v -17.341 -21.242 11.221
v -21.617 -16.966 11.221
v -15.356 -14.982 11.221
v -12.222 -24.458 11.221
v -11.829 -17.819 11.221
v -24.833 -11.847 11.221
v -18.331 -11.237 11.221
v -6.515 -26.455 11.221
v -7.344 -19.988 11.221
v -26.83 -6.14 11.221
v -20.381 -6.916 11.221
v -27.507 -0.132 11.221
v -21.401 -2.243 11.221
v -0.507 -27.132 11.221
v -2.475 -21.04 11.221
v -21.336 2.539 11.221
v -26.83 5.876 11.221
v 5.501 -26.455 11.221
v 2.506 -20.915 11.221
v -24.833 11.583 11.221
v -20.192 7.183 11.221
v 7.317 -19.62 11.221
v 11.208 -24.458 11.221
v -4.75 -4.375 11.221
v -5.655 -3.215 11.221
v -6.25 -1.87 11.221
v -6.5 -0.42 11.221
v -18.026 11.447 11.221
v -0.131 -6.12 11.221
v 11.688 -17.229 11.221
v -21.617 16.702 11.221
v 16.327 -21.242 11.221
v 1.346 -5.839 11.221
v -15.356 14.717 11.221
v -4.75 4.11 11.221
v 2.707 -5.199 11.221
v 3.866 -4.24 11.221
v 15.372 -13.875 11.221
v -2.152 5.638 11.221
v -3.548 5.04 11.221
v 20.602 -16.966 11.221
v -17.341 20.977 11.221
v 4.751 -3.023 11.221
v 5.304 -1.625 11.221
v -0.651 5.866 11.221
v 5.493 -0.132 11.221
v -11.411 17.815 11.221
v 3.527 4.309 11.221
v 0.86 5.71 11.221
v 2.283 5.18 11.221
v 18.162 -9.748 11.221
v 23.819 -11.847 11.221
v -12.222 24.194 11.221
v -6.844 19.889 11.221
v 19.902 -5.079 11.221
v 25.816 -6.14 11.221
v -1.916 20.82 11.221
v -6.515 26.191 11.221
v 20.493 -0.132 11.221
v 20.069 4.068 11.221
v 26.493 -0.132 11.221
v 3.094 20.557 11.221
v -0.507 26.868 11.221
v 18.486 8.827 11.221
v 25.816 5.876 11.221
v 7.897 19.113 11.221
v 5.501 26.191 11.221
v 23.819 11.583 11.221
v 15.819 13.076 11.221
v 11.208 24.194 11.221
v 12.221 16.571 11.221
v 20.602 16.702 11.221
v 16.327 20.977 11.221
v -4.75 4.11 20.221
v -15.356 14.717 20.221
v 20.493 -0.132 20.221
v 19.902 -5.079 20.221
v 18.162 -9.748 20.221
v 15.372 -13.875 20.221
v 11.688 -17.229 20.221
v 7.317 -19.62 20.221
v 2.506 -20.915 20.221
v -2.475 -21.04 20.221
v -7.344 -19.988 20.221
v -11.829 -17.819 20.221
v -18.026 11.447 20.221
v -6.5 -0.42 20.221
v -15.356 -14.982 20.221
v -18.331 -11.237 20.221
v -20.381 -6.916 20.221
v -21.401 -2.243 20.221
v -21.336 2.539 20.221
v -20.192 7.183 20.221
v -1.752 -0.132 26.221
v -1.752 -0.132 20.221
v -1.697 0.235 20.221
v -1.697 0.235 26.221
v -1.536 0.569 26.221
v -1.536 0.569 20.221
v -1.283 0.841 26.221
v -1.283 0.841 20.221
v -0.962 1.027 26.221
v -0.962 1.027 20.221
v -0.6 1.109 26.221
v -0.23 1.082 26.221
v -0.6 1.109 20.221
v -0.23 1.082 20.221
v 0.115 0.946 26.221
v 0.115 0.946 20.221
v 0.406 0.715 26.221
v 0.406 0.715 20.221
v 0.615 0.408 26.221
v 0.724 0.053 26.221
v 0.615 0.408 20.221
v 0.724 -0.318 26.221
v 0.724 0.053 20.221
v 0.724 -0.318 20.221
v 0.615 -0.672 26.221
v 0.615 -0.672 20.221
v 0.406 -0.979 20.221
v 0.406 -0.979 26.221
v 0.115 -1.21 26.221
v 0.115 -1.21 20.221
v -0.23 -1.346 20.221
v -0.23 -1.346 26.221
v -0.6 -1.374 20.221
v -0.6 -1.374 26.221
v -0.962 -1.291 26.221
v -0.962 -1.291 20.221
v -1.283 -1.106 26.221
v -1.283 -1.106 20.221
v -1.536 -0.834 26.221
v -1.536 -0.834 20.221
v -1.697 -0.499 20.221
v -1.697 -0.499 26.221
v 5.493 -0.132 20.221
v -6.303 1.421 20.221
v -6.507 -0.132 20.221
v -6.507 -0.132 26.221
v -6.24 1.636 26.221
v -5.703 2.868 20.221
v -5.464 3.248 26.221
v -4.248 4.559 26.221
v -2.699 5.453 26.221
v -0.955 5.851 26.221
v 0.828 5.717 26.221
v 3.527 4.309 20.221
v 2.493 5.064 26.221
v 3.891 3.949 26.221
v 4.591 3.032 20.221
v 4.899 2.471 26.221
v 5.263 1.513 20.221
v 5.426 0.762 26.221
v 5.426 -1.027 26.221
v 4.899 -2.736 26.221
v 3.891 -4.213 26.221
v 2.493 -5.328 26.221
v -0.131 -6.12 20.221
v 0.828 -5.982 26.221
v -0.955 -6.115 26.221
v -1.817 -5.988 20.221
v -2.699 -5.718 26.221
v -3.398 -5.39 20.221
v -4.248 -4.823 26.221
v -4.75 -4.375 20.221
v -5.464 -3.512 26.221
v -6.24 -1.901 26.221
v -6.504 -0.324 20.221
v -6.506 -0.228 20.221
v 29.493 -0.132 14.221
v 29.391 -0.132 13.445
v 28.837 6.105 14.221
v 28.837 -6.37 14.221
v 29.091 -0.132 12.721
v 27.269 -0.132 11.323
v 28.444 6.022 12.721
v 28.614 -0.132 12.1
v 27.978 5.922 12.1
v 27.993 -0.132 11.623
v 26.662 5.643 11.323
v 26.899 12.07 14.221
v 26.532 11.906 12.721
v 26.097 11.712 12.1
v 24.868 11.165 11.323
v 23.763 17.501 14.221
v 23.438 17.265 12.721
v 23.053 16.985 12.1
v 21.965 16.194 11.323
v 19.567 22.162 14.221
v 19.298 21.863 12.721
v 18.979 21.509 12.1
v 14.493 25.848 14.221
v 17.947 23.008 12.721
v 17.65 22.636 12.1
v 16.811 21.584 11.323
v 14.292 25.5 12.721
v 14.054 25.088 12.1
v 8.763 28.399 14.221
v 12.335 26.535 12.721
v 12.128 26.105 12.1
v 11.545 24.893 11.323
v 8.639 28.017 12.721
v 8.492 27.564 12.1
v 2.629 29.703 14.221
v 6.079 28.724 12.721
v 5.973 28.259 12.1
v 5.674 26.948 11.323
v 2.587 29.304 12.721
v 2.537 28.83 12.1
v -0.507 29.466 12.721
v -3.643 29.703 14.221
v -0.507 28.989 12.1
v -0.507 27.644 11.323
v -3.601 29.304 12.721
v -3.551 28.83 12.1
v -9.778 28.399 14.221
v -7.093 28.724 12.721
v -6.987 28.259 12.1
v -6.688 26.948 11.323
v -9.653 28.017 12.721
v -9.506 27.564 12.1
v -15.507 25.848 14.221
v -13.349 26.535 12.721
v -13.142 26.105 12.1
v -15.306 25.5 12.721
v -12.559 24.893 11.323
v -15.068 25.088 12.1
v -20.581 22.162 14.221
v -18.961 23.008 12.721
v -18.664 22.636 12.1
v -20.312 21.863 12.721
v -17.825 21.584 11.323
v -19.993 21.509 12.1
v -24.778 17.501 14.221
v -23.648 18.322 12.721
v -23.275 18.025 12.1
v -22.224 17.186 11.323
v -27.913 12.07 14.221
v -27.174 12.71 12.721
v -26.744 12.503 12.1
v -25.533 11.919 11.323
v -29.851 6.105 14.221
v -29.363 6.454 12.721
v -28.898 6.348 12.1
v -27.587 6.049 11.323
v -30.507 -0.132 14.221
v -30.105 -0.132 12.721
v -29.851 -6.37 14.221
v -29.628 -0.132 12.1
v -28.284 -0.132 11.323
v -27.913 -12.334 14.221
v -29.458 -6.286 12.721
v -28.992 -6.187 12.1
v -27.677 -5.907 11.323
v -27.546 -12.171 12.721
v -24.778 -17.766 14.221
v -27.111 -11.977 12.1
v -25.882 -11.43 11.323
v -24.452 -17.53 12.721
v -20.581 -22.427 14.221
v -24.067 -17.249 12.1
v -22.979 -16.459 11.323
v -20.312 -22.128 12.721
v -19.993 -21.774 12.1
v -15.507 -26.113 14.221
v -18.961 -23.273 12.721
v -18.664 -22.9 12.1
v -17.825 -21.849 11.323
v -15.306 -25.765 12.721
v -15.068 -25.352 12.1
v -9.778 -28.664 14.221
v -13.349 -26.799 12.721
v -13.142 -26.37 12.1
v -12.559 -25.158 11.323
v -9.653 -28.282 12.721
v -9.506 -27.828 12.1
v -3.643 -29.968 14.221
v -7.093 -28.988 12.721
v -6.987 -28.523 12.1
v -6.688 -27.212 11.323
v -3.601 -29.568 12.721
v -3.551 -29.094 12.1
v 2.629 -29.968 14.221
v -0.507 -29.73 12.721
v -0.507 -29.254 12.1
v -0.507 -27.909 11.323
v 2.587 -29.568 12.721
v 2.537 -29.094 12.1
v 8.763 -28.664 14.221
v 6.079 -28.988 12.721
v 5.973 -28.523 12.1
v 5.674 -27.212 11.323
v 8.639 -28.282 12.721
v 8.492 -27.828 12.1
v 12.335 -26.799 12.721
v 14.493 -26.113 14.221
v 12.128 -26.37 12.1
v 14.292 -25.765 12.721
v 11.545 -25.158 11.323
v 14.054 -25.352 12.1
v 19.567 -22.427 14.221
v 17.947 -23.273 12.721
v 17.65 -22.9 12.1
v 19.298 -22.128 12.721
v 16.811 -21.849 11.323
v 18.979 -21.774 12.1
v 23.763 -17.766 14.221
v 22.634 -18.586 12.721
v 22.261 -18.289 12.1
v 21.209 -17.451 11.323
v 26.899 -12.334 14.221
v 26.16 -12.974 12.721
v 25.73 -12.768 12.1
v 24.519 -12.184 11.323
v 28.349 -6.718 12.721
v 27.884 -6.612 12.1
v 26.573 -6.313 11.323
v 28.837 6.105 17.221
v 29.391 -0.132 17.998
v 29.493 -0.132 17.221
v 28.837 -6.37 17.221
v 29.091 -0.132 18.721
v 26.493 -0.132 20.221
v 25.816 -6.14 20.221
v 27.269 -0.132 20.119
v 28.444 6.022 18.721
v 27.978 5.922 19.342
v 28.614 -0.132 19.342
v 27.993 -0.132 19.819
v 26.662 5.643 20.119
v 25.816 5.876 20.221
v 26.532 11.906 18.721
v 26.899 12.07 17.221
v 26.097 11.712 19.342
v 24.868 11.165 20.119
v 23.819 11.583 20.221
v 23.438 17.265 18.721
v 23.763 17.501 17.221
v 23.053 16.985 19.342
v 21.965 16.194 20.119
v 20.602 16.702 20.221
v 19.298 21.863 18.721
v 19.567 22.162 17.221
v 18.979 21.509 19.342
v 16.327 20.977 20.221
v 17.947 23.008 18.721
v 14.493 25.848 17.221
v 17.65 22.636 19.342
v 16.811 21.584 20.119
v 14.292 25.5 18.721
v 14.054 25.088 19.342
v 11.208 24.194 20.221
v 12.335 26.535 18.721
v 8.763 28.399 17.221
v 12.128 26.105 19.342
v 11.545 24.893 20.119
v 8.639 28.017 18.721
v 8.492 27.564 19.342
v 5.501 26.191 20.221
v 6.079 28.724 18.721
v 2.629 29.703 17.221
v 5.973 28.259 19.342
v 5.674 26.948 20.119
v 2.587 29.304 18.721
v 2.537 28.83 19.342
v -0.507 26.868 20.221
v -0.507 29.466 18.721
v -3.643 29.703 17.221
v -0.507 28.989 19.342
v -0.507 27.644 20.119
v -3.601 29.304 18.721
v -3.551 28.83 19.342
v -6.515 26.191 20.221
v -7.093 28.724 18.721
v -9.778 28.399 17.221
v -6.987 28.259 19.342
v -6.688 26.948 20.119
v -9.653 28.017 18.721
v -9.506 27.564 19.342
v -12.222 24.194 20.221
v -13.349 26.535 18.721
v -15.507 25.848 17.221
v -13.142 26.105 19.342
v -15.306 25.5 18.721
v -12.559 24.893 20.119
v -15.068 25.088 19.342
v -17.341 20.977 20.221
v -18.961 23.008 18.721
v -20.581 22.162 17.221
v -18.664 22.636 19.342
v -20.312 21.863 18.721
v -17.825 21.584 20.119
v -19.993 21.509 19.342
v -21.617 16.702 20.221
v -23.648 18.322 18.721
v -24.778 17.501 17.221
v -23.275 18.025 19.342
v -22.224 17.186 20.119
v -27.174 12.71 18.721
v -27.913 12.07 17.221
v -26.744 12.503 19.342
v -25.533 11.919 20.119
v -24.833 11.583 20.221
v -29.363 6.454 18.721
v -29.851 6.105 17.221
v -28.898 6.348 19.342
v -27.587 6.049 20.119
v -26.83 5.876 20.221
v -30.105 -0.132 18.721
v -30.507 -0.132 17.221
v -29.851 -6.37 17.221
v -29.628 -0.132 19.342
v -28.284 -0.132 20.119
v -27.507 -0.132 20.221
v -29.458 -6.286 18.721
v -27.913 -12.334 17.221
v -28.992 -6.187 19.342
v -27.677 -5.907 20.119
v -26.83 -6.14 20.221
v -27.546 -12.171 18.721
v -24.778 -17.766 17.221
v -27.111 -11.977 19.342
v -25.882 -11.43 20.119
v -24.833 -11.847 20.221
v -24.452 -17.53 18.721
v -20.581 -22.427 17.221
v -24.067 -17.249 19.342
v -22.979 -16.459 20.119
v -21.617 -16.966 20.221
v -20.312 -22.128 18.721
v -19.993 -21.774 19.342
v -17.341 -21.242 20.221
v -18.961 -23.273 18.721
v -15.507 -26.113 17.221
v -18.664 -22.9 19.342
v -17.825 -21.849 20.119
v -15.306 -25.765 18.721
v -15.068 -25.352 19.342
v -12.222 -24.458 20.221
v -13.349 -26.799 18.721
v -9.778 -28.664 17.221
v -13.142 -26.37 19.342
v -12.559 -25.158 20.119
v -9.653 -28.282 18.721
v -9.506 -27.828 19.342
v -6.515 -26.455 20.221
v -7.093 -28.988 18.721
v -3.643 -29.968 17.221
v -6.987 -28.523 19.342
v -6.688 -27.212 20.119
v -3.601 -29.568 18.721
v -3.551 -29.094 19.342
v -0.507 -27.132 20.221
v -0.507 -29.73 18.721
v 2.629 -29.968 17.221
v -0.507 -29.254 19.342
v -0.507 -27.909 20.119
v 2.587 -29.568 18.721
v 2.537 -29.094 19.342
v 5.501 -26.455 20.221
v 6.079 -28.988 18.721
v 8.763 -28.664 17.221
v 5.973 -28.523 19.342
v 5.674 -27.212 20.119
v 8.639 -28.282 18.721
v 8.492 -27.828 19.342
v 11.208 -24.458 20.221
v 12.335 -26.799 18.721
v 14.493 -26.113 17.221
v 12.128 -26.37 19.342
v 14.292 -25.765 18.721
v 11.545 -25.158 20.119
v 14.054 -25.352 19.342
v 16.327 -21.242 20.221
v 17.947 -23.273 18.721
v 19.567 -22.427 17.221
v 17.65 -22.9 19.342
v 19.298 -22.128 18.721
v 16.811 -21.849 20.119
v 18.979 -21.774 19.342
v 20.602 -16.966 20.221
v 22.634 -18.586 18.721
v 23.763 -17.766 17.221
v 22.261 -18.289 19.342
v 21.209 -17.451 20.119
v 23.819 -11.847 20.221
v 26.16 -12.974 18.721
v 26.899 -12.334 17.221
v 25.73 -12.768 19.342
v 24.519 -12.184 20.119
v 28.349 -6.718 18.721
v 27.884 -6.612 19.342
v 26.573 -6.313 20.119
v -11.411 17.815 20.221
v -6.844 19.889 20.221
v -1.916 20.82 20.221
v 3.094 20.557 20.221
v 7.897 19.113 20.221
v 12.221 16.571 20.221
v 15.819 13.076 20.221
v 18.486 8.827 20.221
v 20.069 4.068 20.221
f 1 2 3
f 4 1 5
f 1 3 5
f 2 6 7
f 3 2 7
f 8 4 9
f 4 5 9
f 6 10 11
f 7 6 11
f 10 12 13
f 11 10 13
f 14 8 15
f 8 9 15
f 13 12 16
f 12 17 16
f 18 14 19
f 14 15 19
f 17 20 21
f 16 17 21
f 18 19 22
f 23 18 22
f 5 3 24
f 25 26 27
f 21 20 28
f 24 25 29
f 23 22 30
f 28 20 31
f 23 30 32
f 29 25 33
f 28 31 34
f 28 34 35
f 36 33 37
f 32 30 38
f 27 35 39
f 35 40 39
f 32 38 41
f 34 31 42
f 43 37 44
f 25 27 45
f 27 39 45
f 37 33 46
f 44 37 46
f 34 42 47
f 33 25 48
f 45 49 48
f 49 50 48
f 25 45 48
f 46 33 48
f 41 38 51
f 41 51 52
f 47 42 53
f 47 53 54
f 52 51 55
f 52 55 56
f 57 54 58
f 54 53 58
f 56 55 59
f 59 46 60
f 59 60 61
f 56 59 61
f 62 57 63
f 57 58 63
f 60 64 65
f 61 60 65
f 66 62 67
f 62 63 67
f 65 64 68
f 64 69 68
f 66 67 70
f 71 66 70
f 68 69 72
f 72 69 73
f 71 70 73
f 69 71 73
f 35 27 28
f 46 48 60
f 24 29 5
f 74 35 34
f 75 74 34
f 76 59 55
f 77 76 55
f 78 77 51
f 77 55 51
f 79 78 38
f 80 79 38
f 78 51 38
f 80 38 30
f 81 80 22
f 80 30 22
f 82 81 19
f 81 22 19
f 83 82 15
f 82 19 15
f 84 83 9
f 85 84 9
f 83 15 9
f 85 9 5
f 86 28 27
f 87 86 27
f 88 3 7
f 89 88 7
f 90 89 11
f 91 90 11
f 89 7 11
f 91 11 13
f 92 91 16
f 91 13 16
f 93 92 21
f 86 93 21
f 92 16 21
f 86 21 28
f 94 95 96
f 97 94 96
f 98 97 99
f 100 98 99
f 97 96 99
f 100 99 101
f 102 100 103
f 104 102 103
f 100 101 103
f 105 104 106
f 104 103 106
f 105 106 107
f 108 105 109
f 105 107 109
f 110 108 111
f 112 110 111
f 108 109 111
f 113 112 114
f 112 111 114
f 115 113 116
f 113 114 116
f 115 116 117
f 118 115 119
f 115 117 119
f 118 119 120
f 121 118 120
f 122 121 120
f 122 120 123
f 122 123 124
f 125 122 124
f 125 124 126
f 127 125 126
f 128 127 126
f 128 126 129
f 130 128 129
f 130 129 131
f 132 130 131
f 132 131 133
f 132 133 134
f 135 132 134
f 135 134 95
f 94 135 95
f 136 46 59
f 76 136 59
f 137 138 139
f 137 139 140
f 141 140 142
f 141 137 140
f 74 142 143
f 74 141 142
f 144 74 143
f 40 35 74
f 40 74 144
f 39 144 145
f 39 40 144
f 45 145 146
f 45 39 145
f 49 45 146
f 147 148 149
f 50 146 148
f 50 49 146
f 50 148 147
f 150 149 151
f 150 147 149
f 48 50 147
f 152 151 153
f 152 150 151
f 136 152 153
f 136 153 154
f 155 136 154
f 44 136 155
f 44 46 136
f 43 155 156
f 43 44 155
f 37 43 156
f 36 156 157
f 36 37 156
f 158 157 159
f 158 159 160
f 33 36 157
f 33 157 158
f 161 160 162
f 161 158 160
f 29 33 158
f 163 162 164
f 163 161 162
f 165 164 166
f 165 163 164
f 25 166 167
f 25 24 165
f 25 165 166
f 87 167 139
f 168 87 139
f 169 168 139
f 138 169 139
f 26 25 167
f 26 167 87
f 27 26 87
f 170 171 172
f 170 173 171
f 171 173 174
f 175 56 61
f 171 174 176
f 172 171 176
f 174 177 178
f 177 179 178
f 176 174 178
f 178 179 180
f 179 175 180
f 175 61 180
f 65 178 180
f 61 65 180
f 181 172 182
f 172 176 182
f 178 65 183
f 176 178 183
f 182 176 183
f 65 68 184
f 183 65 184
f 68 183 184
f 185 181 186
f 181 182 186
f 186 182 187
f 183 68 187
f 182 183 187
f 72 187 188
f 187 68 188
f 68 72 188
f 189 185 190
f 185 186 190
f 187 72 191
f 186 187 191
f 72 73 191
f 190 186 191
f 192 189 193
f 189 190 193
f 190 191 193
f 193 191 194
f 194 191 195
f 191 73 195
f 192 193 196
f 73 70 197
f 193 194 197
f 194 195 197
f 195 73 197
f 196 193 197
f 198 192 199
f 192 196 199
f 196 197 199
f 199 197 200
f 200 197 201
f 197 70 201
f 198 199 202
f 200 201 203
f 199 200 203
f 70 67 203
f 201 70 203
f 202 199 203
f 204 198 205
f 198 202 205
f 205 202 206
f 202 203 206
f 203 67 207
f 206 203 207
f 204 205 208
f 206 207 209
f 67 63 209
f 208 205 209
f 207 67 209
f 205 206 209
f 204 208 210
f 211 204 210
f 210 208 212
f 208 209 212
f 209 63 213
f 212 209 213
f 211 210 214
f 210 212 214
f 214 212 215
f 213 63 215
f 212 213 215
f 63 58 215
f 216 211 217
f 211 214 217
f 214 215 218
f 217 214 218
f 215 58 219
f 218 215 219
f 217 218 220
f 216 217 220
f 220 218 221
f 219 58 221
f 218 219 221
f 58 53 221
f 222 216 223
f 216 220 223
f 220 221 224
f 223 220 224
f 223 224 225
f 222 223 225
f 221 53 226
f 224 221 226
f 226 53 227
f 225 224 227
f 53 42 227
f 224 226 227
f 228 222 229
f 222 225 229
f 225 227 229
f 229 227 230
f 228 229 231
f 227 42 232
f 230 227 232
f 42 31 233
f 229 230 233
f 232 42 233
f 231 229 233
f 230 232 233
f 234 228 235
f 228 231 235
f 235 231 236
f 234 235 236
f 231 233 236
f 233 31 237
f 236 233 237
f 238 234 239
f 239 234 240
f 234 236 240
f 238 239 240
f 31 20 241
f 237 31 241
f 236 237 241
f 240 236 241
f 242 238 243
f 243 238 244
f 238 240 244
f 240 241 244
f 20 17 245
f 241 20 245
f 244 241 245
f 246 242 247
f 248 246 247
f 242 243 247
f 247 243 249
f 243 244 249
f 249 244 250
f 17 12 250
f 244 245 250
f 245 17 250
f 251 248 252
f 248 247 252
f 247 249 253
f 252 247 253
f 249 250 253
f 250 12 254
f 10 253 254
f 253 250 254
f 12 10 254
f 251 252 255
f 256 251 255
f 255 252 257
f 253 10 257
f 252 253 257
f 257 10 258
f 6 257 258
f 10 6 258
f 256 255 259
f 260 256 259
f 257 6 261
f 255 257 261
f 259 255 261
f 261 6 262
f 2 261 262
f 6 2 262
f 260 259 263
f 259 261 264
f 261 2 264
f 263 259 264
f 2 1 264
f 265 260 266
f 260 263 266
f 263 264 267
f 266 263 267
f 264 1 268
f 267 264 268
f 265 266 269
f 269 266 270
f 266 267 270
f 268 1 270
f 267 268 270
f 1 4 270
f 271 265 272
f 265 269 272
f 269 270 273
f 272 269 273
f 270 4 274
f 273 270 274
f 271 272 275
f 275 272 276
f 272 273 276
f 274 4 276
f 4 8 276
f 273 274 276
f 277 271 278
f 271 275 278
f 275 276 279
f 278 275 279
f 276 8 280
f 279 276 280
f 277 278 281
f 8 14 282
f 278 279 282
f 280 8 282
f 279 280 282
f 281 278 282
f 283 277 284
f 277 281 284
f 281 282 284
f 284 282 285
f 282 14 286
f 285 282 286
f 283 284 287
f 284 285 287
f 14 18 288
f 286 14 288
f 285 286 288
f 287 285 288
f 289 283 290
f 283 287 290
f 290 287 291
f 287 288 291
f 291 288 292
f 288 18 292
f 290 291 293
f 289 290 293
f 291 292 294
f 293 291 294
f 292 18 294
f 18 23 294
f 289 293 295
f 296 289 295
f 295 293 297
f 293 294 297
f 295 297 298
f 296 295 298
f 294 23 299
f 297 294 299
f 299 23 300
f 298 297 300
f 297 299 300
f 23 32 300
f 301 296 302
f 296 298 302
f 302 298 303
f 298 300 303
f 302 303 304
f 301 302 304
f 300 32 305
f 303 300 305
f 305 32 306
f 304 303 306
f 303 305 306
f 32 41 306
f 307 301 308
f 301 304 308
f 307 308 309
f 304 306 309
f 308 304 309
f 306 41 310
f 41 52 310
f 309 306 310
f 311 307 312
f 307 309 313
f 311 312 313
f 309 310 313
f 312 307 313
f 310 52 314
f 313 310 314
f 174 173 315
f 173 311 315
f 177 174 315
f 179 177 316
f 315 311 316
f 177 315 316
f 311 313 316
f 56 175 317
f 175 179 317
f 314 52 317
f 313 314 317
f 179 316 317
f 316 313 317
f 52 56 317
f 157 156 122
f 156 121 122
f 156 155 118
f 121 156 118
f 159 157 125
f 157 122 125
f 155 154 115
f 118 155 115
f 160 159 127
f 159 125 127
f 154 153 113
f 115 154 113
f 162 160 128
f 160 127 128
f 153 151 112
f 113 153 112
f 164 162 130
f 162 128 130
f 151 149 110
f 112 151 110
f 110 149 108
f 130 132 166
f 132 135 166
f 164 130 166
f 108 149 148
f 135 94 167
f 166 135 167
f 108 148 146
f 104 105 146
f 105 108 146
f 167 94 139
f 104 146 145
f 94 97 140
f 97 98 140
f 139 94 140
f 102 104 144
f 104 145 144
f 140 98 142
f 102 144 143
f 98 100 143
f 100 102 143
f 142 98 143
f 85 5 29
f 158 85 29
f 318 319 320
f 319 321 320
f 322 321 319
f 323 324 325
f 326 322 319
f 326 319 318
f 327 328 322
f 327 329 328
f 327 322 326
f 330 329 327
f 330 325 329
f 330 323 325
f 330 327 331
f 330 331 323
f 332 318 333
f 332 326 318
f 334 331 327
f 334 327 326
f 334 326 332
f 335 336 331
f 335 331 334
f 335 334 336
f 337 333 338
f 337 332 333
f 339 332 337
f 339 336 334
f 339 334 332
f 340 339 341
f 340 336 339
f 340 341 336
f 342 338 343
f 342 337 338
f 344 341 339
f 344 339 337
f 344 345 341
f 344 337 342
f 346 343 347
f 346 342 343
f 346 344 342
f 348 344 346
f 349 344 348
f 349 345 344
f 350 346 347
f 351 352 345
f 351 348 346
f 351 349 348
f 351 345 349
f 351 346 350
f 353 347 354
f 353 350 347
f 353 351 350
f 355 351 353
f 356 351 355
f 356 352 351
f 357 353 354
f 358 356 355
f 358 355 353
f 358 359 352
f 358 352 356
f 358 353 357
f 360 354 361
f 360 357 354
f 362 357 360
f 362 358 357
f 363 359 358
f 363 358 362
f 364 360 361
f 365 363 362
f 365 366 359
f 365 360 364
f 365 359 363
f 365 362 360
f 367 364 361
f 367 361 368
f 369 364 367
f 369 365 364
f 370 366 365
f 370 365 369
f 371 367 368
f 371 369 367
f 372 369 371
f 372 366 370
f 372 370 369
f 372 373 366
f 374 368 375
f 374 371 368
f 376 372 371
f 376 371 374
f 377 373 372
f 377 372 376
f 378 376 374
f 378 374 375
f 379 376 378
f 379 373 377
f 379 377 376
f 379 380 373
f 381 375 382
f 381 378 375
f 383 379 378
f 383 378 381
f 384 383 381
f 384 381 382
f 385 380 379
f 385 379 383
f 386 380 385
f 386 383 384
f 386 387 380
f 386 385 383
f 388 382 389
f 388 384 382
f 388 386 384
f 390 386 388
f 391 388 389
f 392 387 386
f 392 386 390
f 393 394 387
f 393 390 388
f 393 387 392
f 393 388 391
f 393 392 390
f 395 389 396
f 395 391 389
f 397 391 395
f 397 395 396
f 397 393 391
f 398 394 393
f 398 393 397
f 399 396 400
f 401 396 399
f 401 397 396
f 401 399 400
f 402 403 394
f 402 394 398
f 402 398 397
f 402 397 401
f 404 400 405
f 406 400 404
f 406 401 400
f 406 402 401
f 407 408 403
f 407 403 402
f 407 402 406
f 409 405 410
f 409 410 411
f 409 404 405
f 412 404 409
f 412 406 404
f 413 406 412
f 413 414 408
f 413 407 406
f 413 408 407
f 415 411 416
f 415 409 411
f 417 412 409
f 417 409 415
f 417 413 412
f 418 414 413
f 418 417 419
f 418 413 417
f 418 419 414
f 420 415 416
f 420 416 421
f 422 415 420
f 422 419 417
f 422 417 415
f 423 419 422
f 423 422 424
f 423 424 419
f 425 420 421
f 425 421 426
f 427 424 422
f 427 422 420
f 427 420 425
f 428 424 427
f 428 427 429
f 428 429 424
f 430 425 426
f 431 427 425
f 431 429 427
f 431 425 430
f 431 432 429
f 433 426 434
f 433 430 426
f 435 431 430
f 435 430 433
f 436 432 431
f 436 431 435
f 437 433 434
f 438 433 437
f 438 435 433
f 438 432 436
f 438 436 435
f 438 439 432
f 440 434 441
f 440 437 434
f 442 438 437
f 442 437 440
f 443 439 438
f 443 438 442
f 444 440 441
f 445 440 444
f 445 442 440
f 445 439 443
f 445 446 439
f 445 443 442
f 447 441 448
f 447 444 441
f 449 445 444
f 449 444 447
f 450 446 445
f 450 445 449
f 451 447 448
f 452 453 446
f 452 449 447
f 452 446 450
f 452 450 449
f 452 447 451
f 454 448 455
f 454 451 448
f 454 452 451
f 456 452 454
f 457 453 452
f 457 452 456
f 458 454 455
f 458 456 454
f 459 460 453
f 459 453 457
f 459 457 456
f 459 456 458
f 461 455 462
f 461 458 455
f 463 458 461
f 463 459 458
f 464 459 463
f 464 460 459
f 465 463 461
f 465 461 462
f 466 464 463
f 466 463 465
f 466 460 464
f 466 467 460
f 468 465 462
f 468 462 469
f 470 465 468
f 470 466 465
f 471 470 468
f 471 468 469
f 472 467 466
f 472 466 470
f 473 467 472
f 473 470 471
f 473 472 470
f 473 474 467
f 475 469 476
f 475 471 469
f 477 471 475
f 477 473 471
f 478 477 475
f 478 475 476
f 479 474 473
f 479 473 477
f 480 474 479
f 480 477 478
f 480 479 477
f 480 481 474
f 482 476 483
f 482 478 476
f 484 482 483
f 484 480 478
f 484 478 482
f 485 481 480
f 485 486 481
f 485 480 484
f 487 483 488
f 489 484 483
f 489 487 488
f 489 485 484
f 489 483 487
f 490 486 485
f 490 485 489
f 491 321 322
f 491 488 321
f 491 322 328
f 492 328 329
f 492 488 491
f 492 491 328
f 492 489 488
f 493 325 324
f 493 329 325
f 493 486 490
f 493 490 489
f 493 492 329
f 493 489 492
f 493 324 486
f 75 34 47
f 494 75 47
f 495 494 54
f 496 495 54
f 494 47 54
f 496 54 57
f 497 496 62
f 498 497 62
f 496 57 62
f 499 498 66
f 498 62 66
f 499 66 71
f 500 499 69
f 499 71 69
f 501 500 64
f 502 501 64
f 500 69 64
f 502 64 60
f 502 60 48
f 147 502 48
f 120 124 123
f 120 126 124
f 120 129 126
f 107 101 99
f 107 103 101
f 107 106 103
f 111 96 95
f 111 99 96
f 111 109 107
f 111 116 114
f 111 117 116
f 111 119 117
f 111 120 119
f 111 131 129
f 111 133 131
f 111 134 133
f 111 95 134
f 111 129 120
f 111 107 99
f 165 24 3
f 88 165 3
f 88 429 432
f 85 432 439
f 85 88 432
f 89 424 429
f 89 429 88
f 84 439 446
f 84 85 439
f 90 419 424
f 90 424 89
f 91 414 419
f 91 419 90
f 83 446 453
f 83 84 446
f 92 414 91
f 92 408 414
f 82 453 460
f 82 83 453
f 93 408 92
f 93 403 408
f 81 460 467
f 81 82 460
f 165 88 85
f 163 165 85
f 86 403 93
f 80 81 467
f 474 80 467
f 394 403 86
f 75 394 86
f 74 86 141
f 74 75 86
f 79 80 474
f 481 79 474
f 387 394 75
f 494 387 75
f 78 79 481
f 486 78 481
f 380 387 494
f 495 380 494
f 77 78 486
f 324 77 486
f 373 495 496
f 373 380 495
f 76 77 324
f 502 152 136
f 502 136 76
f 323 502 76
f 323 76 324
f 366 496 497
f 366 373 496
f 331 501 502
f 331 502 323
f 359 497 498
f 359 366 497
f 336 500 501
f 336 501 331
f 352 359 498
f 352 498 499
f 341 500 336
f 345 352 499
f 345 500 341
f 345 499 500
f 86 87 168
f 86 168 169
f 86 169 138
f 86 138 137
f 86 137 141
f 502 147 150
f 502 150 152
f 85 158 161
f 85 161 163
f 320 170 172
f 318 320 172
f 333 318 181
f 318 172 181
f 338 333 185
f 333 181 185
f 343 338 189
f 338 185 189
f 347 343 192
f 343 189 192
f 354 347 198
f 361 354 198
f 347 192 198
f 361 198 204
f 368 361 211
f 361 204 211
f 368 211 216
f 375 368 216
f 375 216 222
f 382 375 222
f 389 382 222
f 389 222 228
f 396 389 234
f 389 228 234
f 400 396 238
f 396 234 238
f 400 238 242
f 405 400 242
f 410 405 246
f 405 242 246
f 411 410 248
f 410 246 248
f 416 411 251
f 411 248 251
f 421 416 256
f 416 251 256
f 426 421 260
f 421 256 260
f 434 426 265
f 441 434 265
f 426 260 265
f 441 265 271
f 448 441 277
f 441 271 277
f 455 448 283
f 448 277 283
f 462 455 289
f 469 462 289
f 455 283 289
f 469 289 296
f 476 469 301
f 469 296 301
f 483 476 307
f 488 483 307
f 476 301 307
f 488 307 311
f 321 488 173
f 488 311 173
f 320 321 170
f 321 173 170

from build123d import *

# Parameters (mm, degrees)
SKETCH1_R           = 100
BOSS_EXTRUDE1_DEPTH = 30
FILLET2_R           = 10
SKETCH2_R           = 20
SKETCH2_R_2         = 4.15
BOSS_EXTRUDE2_DEPTH = 50
SCALE1_SCALE        = 0.05
SCALE2_SCALE        = 6


with BuildPart() as part:
    # Sketch1 → Boss-Extrude1 (new body)
    with BuildSketch(Plane.XY):
        Circle(SKETCH1_R)
        with BuildLine():
            Line((-10.606601718, -10.606601718), (-49.497474683, -49.497474683))
            ThreePointArc((-49.497474683, -49.497474683), (-69.64553071, -7.03562734), (-58.396917549, 38.597927675))
            Line((-58.396917549, 38.597927675), (-10.606601718, -10.606601718))
        make_face(mode=Mode.SUBTRACT)
        with BuildLine():
            ThreePointArc((10.606601718, -10.606601718), (13.858192988, -5.740251485), (15, 0))
            Line((15, 0), (70, 0))
            ThreePointArc((70, 0), (33.601511791, -61.407966954), (-37.741097297, -58.954300732))
            Line((-37.741097297, -58.954300732), (10.606601718, -10.606601718))
        make_face(mode=Mode.SUBTRACT)
        with BuildLine():
            ThreePointArc((0, 15), (-5.740251485, 13.858192988), (-10.606601718, 10.606601718))
            Line((-10.606601718, 10.606601718), (-49.497474683, 49.497474683))
            ThreePointArc((-49.497474683, 49.497474683), (20.152118643, 67.036498374), (68.585712798, 14))
            Line((68.585712798, 14), (0, 15))
        make_face(mode=Mode.SUBTRACT)
    extrude(amount=BOSS_EXTRUDE1_DEPTH)

    # Fillet2
    fillet2_edges = [part.edges().sort_by_distance(p)[0] for p in [
        (-100, 0, 0),
        (-100, 0, 30),
    ]]
    fillet(fillet2_edges, radius=FILLET2_R)

    # Sketch2 → Boss-Extrude2 (add)
    with BuildSketch(Plane(origin=(0, 0, 0), x_dir=(-1, 0, 0), z_dir=(0, 0, -1))):
        Circle(SKETCH2_R)
        Circle(SKETCH2_R_2, mode=Mode.SUBTRACT)
    extrude(amount=-BOSS_EXTRUDE2_DEPTH)


with BuildPart() as part_1:
    # Scale1: scaled about (-0.724367868, -0.188947022, 16.030178363)
    add(part.part.scale(SCALE1_SCALE).moved(Location((-0.688149475, -0.179499671, 15.228669445))))


with BuildPart() as part_2:
    # Scale2: scaled about (-0.724367868, -0.188947022, 16.030178363)
    add(part_1.part.scale(SCALE2_SCALE).moved(Location((3.62183934, 0.94473511, -80.150891815))))


solid = part_2.part
